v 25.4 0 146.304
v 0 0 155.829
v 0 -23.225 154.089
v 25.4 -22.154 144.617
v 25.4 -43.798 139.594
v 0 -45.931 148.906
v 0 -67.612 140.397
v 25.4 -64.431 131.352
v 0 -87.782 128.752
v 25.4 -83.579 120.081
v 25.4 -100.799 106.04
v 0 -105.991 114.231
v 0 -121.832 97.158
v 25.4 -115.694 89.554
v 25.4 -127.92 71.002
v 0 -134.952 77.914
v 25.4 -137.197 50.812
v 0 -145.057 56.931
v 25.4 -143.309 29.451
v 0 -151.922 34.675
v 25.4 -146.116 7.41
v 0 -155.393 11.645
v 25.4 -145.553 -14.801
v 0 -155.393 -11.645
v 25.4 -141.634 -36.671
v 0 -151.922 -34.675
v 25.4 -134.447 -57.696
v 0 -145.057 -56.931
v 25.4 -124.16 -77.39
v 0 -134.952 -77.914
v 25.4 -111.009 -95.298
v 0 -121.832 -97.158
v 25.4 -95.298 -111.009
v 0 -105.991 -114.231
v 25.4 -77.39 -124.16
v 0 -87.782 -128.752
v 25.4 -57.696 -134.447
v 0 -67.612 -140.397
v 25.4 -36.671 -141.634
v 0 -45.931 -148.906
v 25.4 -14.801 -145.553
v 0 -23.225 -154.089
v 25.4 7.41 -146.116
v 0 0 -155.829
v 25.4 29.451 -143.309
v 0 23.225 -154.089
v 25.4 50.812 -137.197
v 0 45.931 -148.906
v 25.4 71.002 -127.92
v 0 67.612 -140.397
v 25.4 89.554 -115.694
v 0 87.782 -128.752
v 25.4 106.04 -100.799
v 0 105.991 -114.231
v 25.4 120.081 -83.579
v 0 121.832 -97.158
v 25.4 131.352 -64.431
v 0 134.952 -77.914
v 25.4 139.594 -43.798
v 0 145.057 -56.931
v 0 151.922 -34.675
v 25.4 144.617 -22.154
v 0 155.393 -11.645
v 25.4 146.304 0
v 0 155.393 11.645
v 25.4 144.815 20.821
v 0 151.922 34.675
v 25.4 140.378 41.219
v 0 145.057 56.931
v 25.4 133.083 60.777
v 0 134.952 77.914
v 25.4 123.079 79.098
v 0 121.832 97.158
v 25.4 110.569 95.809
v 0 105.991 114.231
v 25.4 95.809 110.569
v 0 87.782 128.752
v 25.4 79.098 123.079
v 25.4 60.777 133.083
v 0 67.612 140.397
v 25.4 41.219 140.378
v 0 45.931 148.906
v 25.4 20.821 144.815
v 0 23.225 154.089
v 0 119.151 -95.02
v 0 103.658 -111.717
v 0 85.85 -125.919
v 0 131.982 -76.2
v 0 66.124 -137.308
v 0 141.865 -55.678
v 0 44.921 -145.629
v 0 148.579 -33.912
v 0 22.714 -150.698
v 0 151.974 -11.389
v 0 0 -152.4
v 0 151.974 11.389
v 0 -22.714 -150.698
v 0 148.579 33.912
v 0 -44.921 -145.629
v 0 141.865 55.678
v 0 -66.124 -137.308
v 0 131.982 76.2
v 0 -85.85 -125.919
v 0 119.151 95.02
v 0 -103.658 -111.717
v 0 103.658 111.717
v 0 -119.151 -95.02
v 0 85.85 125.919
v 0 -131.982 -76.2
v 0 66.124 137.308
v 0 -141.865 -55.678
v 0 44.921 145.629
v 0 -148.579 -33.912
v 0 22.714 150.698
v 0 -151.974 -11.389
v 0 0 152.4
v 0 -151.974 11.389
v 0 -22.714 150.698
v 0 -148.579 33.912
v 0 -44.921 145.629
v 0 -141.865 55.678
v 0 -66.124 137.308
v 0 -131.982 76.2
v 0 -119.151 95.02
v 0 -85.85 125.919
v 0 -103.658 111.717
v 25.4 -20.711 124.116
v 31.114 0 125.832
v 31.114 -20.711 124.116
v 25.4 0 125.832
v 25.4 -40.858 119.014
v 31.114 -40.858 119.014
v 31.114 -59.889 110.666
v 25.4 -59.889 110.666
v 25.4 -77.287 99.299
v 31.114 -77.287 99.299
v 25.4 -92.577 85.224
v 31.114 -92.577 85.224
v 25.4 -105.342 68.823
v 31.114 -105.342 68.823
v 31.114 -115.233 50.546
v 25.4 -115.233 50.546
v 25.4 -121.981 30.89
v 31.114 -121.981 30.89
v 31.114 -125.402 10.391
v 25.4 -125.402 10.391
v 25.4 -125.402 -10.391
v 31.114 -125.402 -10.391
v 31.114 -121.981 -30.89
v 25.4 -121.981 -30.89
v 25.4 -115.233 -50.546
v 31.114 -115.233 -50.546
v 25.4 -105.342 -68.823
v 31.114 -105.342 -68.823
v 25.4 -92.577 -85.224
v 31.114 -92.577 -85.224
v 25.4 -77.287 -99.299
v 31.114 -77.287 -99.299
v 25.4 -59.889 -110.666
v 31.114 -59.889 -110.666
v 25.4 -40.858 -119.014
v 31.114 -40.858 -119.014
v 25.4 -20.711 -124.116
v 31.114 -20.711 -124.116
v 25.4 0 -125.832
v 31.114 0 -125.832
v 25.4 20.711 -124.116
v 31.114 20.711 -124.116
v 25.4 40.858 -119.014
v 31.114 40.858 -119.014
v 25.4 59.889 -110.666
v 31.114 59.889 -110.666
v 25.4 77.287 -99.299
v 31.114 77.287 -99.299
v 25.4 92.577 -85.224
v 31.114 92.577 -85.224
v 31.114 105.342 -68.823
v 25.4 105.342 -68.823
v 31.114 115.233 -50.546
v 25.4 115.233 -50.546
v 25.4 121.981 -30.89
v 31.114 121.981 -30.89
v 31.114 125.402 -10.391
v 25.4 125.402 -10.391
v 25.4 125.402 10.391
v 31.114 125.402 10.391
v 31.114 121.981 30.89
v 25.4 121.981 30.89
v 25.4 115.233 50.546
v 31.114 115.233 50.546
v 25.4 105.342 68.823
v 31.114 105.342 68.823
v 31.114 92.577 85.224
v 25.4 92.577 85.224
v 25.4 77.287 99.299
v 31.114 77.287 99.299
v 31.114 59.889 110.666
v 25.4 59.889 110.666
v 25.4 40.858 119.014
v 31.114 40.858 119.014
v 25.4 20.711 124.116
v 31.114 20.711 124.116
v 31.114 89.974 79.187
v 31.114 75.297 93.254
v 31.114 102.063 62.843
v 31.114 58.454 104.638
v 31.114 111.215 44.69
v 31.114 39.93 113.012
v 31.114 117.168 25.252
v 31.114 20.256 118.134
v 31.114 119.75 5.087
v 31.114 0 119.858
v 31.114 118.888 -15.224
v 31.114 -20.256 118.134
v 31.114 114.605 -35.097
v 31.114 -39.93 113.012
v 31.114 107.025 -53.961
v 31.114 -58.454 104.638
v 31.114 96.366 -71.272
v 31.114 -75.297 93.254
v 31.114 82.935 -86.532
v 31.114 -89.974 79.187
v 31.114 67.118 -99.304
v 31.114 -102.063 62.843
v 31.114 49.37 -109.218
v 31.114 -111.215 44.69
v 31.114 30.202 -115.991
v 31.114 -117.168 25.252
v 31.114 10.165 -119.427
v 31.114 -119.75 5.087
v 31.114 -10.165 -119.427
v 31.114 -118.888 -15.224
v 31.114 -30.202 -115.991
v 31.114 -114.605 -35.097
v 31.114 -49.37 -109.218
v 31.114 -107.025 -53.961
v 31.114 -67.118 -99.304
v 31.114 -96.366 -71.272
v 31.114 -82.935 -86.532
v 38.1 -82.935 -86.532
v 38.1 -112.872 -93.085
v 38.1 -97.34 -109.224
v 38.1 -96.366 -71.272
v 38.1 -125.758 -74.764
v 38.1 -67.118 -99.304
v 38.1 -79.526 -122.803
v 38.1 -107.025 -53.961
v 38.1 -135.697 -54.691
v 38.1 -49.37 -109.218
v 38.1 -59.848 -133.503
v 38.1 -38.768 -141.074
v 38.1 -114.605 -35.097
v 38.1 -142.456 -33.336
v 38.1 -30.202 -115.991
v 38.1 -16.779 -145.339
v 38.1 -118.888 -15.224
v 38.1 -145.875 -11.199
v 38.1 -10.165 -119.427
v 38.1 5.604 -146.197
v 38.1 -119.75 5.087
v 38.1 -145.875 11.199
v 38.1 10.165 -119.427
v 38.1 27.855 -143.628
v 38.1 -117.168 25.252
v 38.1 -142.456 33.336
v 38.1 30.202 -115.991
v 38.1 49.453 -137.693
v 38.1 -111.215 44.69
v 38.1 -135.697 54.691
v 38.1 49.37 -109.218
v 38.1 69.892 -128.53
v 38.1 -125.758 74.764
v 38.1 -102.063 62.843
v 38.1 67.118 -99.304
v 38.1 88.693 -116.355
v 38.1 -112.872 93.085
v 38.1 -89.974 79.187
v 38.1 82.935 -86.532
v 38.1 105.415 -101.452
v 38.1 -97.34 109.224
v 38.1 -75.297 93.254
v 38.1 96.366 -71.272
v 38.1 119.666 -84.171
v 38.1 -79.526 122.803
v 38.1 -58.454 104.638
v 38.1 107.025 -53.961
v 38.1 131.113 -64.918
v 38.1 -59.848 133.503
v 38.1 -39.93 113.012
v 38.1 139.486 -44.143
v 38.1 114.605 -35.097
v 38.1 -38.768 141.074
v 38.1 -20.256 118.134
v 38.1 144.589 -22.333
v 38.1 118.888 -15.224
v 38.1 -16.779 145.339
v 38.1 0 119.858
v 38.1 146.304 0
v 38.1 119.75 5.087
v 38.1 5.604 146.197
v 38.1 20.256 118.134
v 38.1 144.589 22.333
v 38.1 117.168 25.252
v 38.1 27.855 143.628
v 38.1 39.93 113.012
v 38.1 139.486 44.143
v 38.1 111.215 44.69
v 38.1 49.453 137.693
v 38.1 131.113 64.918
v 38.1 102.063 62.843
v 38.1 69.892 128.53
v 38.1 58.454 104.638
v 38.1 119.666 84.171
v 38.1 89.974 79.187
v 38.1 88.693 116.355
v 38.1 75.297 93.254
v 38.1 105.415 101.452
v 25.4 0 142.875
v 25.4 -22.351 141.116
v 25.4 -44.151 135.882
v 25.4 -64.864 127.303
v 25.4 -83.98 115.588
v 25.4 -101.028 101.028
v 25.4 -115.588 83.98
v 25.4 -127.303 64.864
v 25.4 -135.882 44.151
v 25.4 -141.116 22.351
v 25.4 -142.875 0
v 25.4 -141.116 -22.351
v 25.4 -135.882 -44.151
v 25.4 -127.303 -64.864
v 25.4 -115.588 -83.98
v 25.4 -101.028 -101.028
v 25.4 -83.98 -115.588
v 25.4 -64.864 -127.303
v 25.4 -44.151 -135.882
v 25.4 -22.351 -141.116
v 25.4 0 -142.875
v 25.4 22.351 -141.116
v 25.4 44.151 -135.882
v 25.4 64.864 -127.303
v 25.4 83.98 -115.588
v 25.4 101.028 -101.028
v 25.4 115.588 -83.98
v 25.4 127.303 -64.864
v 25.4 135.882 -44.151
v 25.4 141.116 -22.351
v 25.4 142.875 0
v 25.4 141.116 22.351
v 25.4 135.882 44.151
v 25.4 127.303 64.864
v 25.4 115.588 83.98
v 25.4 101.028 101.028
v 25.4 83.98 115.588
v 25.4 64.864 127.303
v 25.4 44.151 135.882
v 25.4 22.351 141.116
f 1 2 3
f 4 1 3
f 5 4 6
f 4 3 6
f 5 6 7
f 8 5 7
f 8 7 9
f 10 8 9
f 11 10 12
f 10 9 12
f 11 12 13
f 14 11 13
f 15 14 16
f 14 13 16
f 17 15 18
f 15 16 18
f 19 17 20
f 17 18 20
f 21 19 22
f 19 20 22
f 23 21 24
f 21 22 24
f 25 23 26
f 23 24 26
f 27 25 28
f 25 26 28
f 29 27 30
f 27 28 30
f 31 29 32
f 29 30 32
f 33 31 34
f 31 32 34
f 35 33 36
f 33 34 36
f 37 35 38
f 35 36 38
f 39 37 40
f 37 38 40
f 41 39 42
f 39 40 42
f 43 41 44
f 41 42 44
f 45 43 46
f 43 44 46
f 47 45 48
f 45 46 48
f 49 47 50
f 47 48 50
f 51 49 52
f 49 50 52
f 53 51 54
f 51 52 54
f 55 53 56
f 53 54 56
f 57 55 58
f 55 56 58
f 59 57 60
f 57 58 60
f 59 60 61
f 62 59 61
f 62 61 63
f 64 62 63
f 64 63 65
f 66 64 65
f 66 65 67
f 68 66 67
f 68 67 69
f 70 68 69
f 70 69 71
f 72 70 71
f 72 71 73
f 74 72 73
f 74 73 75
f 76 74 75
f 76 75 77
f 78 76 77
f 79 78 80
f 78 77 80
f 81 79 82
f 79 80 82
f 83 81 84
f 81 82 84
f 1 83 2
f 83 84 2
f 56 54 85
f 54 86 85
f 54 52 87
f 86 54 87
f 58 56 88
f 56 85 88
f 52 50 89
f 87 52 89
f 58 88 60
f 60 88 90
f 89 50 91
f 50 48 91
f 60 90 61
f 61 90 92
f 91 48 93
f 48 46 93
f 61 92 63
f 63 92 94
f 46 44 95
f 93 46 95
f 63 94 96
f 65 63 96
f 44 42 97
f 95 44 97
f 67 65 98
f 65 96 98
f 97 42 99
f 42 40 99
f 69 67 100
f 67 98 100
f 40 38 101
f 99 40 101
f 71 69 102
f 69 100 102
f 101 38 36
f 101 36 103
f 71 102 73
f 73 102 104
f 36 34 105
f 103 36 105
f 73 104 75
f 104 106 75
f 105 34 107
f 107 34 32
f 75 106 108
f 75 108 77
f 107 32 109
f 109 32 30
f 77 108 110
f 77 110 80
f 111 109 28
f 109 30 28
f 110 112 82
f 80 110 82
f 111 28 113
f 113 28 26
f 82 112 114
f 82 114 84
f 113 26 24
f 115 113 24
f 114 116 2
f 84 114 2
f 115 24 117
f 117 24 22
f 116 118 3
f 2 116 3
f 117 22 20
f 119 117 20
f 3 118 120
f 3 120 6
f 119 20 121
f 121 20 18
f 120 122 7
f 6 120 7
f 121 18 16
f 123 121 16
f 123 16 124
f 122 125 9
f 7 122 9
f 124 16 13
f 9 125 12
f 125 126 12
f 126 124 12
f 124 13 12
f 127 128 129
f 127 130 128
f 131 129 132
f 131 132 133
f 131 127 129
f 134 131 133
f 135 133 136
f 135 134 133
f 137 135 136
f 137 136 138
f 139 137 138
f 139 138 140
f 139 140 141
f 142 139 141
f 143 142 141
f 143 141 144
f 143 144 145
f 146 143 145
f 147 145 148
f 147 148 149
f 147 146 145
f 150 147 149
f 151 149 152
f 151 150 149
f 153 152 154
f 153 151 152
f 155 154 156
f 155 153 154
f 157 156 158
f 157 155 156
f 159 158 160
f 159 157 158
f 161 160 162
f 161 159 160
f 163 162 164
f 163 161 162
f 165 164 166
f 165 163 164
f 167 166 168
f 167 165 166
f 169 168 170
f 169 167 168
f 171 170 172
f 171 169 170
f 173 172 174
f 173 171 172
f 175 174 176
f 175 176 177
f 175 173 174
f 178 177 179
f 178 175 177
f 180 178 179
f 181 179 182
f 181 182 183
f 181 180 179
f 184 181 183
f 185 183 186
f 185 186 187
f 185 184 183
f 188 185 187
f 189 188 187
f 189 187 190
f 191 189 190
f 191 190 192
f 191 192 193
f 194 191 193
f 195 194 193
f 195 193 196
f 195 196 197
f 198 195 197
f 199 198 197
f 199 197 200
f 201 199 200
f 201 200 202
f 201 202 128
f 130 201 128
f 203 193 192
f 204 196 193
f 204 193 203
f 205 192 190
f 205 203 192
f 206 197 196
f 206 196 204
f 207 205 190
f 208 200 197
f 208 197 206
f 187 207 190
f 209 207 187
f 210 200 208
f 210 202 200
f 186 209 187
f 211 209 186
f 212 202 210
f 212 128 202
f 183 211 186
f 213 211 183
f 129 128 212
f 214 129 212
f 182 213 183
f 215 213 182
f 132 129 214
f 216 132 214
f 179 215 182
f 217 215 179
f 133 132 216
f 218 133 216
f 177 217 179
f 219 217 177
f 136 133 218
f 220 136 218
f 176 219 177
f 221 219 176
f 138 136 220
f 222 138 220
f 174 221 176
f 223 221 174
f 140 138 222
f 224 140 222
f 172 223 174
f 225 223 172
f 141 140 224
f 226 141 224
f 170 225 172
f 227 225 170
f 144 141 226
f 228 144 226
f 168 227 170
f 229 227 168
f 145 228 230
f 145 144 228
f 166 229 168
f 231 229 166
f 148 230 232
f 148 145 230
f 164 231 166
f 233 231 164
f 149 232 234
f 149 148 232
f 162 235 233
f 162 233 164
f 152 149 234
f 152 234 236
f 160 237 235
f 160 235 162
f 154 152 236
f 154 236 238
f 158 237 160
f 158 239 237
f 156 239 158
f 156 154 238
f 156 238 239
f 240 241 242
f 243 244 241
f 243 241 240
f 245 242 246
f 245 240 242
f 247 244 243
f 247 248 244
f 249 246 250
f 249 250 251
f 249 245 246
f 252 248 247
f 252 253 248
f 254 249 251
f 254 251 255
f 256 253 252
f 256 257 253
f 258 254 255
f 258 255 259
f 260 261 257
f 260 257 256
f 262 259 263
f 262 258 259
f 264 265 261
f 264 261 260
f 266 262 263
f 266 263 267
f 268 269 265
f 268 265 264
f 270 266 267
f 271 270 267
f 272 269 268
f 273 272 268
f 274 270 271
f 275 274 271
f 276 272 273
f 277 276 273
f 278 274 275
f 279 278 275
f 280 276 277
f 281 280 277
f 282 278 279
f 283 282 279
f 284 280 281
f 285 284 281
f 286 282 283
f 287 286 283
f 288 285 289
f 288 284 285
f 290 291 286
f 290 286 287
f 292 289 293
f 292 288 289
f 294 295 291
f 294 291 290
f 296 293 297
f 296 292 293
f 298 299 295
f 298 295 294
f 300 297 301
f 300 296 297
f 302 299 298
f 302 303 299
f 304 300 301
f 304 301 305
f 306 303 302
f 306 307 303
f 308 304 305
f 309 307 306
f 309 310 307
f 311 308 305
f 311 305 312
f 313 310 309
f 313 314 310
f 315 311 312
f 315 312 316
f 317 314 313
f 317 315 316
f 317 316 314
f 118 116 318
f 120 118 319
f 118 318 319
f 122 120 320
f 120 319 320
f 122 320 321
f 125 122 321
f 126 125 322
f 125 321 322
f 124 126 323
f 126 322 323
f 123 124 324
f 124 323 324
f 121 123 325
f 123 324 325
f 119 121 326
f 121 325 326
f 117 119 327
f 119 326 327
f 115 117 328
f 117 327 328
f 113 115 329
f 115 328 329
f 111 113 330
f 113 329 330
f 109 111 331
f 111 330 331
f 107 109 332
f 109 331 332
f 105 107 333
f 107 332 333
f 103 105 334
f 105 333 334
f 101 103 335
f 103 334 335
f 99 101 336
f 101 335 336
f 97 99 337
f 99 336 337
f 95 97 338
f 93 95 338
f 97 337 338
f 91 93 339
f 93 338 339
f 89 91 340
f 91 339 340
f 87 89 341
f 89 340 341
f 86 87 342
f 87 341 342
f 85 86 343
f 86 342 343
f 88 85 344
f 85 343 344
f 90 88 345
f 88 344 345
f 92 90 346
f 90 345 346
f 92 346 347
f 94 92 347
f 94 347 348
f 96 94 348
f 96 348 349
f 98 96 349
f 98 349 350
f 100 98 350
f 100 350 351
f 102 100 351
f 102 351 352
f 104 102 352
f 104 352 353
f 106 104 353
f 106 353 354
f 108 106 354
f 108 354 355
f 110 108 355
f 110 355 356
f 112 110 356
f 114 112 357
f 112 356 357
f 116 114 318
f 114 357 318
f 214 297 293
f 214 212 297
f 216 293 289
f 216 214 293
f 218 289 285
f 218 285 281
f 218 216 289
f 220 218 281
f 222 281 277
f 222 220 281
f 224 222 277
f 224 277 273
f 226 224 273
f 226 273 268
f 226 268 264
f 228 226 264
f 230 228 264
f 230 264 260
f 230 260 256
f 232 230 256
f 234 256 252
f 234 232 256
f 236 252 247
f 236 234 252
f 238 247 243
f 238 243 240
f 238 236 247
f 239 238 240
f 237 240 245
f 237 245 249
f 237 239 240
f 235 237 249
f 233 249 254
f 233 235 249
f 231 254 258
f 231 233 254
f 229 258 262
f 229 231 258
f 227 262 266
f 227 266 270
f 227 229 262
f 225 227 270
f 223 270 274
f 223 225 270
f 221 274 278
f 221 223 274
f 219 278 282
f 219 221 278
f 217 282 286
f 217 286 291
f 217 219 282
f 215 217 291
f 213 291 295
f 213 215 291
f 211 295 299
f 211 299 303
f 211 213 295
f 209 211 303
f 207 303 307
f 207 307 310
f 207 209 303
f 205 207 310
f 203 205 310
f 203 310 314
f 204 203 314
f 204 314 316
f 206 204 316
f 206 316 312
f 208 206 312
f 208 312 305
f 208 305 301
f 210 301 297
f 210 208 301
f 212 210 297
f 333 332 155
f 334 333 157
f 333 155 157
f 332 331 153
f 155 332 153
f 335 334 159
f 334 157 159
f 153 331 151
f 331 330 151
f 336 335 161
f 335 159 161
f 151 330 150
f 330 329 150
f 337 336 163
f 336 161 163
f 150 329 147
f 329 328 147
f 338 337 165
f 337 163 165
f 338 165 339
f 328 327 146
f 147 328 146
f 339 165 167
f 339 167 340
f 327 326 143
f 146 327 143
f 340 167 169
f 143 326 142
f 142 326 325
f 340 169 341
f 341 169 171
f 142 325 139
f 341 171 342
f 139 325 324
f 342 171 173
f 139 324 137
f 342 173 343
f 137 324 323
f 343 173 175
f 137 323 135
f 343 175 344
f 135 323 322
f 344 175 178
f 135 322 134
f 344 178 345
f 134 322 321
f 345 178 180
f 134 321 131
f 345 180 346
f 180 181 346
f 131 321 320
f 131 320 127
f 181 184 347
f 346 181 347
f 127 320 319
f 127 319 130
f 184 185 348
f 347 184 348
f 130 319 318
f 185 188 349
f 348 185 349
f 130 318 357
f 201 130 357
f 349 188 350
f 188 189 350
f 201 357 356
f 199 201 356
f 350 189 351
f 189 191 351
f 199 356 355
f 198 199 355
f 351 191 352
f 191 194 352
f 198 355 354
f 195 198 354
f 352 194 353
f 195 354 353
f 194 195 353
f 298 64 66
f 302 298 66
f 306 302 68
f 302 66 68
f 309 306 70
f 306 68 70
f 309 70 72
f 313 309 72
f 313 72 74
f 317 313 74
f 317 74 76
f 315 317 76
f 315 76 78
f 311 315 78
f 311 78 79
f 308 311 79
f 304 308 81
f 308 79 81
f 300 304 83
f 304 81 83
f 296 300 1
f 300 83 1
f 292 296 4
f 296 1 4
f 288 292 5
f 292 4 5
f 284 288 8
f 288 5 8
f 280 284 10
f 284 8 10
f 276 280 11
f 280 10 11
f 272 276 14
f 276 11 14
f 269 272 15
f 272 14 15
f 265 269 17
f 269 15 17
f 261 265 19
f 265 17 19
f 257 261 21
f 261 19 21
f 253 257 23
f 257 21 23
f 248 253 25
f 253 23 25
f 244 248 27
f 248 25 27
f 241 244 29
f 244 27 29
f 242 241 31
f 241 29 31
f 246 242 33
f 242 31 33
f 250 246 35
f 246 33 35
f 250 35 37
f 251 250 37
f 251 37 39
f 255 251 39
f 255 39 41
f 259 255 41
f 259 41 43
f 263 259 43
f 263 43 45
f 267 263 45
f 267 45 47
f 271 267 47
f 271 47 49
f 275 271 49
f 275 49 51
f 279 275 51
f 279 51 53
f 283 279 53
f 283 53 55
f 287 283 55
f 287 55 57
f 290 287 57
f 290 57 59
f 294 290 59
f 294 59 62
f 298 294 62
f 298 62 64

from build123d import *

# Parameters (mm, degrees)
F2_R     = 146.304
F3_DEPTH = 12.7


with BuildPart() as f1:
    # F0 (on Front) → F1 (revolve)
    with BuildSketch(Plane.XZ):
        Polygon((0, 155.829), (0, 152.4), (25.4, 142.875), (25.4, 146.304), align=None)
    revolve(axis=Axis((14.760356, 0, 0), (1, 0, 0)))

    # F2 (on face) → F3 (join)
    with BuildSketch(Plane.YZ.offset(25.4)):
        Circle(F2_R)
    extrude(amount=F3_DEPTH)

    # F4 (on Front) → F5 (revolve, cut)
    with BuildSketch(Plane.XZ):
        Polygon((31.113731, 125.831813), (25.4, 125.831813), (25.4, 0), (38.1, 0), (38.1, 119.858369), (31.113731, 119.858369), align=None)
    revolve(axis=Axis((39.318715, 0, 0), (1, 0, 0)), mode=Mode.SUBTRACT)


solid = f1.part
